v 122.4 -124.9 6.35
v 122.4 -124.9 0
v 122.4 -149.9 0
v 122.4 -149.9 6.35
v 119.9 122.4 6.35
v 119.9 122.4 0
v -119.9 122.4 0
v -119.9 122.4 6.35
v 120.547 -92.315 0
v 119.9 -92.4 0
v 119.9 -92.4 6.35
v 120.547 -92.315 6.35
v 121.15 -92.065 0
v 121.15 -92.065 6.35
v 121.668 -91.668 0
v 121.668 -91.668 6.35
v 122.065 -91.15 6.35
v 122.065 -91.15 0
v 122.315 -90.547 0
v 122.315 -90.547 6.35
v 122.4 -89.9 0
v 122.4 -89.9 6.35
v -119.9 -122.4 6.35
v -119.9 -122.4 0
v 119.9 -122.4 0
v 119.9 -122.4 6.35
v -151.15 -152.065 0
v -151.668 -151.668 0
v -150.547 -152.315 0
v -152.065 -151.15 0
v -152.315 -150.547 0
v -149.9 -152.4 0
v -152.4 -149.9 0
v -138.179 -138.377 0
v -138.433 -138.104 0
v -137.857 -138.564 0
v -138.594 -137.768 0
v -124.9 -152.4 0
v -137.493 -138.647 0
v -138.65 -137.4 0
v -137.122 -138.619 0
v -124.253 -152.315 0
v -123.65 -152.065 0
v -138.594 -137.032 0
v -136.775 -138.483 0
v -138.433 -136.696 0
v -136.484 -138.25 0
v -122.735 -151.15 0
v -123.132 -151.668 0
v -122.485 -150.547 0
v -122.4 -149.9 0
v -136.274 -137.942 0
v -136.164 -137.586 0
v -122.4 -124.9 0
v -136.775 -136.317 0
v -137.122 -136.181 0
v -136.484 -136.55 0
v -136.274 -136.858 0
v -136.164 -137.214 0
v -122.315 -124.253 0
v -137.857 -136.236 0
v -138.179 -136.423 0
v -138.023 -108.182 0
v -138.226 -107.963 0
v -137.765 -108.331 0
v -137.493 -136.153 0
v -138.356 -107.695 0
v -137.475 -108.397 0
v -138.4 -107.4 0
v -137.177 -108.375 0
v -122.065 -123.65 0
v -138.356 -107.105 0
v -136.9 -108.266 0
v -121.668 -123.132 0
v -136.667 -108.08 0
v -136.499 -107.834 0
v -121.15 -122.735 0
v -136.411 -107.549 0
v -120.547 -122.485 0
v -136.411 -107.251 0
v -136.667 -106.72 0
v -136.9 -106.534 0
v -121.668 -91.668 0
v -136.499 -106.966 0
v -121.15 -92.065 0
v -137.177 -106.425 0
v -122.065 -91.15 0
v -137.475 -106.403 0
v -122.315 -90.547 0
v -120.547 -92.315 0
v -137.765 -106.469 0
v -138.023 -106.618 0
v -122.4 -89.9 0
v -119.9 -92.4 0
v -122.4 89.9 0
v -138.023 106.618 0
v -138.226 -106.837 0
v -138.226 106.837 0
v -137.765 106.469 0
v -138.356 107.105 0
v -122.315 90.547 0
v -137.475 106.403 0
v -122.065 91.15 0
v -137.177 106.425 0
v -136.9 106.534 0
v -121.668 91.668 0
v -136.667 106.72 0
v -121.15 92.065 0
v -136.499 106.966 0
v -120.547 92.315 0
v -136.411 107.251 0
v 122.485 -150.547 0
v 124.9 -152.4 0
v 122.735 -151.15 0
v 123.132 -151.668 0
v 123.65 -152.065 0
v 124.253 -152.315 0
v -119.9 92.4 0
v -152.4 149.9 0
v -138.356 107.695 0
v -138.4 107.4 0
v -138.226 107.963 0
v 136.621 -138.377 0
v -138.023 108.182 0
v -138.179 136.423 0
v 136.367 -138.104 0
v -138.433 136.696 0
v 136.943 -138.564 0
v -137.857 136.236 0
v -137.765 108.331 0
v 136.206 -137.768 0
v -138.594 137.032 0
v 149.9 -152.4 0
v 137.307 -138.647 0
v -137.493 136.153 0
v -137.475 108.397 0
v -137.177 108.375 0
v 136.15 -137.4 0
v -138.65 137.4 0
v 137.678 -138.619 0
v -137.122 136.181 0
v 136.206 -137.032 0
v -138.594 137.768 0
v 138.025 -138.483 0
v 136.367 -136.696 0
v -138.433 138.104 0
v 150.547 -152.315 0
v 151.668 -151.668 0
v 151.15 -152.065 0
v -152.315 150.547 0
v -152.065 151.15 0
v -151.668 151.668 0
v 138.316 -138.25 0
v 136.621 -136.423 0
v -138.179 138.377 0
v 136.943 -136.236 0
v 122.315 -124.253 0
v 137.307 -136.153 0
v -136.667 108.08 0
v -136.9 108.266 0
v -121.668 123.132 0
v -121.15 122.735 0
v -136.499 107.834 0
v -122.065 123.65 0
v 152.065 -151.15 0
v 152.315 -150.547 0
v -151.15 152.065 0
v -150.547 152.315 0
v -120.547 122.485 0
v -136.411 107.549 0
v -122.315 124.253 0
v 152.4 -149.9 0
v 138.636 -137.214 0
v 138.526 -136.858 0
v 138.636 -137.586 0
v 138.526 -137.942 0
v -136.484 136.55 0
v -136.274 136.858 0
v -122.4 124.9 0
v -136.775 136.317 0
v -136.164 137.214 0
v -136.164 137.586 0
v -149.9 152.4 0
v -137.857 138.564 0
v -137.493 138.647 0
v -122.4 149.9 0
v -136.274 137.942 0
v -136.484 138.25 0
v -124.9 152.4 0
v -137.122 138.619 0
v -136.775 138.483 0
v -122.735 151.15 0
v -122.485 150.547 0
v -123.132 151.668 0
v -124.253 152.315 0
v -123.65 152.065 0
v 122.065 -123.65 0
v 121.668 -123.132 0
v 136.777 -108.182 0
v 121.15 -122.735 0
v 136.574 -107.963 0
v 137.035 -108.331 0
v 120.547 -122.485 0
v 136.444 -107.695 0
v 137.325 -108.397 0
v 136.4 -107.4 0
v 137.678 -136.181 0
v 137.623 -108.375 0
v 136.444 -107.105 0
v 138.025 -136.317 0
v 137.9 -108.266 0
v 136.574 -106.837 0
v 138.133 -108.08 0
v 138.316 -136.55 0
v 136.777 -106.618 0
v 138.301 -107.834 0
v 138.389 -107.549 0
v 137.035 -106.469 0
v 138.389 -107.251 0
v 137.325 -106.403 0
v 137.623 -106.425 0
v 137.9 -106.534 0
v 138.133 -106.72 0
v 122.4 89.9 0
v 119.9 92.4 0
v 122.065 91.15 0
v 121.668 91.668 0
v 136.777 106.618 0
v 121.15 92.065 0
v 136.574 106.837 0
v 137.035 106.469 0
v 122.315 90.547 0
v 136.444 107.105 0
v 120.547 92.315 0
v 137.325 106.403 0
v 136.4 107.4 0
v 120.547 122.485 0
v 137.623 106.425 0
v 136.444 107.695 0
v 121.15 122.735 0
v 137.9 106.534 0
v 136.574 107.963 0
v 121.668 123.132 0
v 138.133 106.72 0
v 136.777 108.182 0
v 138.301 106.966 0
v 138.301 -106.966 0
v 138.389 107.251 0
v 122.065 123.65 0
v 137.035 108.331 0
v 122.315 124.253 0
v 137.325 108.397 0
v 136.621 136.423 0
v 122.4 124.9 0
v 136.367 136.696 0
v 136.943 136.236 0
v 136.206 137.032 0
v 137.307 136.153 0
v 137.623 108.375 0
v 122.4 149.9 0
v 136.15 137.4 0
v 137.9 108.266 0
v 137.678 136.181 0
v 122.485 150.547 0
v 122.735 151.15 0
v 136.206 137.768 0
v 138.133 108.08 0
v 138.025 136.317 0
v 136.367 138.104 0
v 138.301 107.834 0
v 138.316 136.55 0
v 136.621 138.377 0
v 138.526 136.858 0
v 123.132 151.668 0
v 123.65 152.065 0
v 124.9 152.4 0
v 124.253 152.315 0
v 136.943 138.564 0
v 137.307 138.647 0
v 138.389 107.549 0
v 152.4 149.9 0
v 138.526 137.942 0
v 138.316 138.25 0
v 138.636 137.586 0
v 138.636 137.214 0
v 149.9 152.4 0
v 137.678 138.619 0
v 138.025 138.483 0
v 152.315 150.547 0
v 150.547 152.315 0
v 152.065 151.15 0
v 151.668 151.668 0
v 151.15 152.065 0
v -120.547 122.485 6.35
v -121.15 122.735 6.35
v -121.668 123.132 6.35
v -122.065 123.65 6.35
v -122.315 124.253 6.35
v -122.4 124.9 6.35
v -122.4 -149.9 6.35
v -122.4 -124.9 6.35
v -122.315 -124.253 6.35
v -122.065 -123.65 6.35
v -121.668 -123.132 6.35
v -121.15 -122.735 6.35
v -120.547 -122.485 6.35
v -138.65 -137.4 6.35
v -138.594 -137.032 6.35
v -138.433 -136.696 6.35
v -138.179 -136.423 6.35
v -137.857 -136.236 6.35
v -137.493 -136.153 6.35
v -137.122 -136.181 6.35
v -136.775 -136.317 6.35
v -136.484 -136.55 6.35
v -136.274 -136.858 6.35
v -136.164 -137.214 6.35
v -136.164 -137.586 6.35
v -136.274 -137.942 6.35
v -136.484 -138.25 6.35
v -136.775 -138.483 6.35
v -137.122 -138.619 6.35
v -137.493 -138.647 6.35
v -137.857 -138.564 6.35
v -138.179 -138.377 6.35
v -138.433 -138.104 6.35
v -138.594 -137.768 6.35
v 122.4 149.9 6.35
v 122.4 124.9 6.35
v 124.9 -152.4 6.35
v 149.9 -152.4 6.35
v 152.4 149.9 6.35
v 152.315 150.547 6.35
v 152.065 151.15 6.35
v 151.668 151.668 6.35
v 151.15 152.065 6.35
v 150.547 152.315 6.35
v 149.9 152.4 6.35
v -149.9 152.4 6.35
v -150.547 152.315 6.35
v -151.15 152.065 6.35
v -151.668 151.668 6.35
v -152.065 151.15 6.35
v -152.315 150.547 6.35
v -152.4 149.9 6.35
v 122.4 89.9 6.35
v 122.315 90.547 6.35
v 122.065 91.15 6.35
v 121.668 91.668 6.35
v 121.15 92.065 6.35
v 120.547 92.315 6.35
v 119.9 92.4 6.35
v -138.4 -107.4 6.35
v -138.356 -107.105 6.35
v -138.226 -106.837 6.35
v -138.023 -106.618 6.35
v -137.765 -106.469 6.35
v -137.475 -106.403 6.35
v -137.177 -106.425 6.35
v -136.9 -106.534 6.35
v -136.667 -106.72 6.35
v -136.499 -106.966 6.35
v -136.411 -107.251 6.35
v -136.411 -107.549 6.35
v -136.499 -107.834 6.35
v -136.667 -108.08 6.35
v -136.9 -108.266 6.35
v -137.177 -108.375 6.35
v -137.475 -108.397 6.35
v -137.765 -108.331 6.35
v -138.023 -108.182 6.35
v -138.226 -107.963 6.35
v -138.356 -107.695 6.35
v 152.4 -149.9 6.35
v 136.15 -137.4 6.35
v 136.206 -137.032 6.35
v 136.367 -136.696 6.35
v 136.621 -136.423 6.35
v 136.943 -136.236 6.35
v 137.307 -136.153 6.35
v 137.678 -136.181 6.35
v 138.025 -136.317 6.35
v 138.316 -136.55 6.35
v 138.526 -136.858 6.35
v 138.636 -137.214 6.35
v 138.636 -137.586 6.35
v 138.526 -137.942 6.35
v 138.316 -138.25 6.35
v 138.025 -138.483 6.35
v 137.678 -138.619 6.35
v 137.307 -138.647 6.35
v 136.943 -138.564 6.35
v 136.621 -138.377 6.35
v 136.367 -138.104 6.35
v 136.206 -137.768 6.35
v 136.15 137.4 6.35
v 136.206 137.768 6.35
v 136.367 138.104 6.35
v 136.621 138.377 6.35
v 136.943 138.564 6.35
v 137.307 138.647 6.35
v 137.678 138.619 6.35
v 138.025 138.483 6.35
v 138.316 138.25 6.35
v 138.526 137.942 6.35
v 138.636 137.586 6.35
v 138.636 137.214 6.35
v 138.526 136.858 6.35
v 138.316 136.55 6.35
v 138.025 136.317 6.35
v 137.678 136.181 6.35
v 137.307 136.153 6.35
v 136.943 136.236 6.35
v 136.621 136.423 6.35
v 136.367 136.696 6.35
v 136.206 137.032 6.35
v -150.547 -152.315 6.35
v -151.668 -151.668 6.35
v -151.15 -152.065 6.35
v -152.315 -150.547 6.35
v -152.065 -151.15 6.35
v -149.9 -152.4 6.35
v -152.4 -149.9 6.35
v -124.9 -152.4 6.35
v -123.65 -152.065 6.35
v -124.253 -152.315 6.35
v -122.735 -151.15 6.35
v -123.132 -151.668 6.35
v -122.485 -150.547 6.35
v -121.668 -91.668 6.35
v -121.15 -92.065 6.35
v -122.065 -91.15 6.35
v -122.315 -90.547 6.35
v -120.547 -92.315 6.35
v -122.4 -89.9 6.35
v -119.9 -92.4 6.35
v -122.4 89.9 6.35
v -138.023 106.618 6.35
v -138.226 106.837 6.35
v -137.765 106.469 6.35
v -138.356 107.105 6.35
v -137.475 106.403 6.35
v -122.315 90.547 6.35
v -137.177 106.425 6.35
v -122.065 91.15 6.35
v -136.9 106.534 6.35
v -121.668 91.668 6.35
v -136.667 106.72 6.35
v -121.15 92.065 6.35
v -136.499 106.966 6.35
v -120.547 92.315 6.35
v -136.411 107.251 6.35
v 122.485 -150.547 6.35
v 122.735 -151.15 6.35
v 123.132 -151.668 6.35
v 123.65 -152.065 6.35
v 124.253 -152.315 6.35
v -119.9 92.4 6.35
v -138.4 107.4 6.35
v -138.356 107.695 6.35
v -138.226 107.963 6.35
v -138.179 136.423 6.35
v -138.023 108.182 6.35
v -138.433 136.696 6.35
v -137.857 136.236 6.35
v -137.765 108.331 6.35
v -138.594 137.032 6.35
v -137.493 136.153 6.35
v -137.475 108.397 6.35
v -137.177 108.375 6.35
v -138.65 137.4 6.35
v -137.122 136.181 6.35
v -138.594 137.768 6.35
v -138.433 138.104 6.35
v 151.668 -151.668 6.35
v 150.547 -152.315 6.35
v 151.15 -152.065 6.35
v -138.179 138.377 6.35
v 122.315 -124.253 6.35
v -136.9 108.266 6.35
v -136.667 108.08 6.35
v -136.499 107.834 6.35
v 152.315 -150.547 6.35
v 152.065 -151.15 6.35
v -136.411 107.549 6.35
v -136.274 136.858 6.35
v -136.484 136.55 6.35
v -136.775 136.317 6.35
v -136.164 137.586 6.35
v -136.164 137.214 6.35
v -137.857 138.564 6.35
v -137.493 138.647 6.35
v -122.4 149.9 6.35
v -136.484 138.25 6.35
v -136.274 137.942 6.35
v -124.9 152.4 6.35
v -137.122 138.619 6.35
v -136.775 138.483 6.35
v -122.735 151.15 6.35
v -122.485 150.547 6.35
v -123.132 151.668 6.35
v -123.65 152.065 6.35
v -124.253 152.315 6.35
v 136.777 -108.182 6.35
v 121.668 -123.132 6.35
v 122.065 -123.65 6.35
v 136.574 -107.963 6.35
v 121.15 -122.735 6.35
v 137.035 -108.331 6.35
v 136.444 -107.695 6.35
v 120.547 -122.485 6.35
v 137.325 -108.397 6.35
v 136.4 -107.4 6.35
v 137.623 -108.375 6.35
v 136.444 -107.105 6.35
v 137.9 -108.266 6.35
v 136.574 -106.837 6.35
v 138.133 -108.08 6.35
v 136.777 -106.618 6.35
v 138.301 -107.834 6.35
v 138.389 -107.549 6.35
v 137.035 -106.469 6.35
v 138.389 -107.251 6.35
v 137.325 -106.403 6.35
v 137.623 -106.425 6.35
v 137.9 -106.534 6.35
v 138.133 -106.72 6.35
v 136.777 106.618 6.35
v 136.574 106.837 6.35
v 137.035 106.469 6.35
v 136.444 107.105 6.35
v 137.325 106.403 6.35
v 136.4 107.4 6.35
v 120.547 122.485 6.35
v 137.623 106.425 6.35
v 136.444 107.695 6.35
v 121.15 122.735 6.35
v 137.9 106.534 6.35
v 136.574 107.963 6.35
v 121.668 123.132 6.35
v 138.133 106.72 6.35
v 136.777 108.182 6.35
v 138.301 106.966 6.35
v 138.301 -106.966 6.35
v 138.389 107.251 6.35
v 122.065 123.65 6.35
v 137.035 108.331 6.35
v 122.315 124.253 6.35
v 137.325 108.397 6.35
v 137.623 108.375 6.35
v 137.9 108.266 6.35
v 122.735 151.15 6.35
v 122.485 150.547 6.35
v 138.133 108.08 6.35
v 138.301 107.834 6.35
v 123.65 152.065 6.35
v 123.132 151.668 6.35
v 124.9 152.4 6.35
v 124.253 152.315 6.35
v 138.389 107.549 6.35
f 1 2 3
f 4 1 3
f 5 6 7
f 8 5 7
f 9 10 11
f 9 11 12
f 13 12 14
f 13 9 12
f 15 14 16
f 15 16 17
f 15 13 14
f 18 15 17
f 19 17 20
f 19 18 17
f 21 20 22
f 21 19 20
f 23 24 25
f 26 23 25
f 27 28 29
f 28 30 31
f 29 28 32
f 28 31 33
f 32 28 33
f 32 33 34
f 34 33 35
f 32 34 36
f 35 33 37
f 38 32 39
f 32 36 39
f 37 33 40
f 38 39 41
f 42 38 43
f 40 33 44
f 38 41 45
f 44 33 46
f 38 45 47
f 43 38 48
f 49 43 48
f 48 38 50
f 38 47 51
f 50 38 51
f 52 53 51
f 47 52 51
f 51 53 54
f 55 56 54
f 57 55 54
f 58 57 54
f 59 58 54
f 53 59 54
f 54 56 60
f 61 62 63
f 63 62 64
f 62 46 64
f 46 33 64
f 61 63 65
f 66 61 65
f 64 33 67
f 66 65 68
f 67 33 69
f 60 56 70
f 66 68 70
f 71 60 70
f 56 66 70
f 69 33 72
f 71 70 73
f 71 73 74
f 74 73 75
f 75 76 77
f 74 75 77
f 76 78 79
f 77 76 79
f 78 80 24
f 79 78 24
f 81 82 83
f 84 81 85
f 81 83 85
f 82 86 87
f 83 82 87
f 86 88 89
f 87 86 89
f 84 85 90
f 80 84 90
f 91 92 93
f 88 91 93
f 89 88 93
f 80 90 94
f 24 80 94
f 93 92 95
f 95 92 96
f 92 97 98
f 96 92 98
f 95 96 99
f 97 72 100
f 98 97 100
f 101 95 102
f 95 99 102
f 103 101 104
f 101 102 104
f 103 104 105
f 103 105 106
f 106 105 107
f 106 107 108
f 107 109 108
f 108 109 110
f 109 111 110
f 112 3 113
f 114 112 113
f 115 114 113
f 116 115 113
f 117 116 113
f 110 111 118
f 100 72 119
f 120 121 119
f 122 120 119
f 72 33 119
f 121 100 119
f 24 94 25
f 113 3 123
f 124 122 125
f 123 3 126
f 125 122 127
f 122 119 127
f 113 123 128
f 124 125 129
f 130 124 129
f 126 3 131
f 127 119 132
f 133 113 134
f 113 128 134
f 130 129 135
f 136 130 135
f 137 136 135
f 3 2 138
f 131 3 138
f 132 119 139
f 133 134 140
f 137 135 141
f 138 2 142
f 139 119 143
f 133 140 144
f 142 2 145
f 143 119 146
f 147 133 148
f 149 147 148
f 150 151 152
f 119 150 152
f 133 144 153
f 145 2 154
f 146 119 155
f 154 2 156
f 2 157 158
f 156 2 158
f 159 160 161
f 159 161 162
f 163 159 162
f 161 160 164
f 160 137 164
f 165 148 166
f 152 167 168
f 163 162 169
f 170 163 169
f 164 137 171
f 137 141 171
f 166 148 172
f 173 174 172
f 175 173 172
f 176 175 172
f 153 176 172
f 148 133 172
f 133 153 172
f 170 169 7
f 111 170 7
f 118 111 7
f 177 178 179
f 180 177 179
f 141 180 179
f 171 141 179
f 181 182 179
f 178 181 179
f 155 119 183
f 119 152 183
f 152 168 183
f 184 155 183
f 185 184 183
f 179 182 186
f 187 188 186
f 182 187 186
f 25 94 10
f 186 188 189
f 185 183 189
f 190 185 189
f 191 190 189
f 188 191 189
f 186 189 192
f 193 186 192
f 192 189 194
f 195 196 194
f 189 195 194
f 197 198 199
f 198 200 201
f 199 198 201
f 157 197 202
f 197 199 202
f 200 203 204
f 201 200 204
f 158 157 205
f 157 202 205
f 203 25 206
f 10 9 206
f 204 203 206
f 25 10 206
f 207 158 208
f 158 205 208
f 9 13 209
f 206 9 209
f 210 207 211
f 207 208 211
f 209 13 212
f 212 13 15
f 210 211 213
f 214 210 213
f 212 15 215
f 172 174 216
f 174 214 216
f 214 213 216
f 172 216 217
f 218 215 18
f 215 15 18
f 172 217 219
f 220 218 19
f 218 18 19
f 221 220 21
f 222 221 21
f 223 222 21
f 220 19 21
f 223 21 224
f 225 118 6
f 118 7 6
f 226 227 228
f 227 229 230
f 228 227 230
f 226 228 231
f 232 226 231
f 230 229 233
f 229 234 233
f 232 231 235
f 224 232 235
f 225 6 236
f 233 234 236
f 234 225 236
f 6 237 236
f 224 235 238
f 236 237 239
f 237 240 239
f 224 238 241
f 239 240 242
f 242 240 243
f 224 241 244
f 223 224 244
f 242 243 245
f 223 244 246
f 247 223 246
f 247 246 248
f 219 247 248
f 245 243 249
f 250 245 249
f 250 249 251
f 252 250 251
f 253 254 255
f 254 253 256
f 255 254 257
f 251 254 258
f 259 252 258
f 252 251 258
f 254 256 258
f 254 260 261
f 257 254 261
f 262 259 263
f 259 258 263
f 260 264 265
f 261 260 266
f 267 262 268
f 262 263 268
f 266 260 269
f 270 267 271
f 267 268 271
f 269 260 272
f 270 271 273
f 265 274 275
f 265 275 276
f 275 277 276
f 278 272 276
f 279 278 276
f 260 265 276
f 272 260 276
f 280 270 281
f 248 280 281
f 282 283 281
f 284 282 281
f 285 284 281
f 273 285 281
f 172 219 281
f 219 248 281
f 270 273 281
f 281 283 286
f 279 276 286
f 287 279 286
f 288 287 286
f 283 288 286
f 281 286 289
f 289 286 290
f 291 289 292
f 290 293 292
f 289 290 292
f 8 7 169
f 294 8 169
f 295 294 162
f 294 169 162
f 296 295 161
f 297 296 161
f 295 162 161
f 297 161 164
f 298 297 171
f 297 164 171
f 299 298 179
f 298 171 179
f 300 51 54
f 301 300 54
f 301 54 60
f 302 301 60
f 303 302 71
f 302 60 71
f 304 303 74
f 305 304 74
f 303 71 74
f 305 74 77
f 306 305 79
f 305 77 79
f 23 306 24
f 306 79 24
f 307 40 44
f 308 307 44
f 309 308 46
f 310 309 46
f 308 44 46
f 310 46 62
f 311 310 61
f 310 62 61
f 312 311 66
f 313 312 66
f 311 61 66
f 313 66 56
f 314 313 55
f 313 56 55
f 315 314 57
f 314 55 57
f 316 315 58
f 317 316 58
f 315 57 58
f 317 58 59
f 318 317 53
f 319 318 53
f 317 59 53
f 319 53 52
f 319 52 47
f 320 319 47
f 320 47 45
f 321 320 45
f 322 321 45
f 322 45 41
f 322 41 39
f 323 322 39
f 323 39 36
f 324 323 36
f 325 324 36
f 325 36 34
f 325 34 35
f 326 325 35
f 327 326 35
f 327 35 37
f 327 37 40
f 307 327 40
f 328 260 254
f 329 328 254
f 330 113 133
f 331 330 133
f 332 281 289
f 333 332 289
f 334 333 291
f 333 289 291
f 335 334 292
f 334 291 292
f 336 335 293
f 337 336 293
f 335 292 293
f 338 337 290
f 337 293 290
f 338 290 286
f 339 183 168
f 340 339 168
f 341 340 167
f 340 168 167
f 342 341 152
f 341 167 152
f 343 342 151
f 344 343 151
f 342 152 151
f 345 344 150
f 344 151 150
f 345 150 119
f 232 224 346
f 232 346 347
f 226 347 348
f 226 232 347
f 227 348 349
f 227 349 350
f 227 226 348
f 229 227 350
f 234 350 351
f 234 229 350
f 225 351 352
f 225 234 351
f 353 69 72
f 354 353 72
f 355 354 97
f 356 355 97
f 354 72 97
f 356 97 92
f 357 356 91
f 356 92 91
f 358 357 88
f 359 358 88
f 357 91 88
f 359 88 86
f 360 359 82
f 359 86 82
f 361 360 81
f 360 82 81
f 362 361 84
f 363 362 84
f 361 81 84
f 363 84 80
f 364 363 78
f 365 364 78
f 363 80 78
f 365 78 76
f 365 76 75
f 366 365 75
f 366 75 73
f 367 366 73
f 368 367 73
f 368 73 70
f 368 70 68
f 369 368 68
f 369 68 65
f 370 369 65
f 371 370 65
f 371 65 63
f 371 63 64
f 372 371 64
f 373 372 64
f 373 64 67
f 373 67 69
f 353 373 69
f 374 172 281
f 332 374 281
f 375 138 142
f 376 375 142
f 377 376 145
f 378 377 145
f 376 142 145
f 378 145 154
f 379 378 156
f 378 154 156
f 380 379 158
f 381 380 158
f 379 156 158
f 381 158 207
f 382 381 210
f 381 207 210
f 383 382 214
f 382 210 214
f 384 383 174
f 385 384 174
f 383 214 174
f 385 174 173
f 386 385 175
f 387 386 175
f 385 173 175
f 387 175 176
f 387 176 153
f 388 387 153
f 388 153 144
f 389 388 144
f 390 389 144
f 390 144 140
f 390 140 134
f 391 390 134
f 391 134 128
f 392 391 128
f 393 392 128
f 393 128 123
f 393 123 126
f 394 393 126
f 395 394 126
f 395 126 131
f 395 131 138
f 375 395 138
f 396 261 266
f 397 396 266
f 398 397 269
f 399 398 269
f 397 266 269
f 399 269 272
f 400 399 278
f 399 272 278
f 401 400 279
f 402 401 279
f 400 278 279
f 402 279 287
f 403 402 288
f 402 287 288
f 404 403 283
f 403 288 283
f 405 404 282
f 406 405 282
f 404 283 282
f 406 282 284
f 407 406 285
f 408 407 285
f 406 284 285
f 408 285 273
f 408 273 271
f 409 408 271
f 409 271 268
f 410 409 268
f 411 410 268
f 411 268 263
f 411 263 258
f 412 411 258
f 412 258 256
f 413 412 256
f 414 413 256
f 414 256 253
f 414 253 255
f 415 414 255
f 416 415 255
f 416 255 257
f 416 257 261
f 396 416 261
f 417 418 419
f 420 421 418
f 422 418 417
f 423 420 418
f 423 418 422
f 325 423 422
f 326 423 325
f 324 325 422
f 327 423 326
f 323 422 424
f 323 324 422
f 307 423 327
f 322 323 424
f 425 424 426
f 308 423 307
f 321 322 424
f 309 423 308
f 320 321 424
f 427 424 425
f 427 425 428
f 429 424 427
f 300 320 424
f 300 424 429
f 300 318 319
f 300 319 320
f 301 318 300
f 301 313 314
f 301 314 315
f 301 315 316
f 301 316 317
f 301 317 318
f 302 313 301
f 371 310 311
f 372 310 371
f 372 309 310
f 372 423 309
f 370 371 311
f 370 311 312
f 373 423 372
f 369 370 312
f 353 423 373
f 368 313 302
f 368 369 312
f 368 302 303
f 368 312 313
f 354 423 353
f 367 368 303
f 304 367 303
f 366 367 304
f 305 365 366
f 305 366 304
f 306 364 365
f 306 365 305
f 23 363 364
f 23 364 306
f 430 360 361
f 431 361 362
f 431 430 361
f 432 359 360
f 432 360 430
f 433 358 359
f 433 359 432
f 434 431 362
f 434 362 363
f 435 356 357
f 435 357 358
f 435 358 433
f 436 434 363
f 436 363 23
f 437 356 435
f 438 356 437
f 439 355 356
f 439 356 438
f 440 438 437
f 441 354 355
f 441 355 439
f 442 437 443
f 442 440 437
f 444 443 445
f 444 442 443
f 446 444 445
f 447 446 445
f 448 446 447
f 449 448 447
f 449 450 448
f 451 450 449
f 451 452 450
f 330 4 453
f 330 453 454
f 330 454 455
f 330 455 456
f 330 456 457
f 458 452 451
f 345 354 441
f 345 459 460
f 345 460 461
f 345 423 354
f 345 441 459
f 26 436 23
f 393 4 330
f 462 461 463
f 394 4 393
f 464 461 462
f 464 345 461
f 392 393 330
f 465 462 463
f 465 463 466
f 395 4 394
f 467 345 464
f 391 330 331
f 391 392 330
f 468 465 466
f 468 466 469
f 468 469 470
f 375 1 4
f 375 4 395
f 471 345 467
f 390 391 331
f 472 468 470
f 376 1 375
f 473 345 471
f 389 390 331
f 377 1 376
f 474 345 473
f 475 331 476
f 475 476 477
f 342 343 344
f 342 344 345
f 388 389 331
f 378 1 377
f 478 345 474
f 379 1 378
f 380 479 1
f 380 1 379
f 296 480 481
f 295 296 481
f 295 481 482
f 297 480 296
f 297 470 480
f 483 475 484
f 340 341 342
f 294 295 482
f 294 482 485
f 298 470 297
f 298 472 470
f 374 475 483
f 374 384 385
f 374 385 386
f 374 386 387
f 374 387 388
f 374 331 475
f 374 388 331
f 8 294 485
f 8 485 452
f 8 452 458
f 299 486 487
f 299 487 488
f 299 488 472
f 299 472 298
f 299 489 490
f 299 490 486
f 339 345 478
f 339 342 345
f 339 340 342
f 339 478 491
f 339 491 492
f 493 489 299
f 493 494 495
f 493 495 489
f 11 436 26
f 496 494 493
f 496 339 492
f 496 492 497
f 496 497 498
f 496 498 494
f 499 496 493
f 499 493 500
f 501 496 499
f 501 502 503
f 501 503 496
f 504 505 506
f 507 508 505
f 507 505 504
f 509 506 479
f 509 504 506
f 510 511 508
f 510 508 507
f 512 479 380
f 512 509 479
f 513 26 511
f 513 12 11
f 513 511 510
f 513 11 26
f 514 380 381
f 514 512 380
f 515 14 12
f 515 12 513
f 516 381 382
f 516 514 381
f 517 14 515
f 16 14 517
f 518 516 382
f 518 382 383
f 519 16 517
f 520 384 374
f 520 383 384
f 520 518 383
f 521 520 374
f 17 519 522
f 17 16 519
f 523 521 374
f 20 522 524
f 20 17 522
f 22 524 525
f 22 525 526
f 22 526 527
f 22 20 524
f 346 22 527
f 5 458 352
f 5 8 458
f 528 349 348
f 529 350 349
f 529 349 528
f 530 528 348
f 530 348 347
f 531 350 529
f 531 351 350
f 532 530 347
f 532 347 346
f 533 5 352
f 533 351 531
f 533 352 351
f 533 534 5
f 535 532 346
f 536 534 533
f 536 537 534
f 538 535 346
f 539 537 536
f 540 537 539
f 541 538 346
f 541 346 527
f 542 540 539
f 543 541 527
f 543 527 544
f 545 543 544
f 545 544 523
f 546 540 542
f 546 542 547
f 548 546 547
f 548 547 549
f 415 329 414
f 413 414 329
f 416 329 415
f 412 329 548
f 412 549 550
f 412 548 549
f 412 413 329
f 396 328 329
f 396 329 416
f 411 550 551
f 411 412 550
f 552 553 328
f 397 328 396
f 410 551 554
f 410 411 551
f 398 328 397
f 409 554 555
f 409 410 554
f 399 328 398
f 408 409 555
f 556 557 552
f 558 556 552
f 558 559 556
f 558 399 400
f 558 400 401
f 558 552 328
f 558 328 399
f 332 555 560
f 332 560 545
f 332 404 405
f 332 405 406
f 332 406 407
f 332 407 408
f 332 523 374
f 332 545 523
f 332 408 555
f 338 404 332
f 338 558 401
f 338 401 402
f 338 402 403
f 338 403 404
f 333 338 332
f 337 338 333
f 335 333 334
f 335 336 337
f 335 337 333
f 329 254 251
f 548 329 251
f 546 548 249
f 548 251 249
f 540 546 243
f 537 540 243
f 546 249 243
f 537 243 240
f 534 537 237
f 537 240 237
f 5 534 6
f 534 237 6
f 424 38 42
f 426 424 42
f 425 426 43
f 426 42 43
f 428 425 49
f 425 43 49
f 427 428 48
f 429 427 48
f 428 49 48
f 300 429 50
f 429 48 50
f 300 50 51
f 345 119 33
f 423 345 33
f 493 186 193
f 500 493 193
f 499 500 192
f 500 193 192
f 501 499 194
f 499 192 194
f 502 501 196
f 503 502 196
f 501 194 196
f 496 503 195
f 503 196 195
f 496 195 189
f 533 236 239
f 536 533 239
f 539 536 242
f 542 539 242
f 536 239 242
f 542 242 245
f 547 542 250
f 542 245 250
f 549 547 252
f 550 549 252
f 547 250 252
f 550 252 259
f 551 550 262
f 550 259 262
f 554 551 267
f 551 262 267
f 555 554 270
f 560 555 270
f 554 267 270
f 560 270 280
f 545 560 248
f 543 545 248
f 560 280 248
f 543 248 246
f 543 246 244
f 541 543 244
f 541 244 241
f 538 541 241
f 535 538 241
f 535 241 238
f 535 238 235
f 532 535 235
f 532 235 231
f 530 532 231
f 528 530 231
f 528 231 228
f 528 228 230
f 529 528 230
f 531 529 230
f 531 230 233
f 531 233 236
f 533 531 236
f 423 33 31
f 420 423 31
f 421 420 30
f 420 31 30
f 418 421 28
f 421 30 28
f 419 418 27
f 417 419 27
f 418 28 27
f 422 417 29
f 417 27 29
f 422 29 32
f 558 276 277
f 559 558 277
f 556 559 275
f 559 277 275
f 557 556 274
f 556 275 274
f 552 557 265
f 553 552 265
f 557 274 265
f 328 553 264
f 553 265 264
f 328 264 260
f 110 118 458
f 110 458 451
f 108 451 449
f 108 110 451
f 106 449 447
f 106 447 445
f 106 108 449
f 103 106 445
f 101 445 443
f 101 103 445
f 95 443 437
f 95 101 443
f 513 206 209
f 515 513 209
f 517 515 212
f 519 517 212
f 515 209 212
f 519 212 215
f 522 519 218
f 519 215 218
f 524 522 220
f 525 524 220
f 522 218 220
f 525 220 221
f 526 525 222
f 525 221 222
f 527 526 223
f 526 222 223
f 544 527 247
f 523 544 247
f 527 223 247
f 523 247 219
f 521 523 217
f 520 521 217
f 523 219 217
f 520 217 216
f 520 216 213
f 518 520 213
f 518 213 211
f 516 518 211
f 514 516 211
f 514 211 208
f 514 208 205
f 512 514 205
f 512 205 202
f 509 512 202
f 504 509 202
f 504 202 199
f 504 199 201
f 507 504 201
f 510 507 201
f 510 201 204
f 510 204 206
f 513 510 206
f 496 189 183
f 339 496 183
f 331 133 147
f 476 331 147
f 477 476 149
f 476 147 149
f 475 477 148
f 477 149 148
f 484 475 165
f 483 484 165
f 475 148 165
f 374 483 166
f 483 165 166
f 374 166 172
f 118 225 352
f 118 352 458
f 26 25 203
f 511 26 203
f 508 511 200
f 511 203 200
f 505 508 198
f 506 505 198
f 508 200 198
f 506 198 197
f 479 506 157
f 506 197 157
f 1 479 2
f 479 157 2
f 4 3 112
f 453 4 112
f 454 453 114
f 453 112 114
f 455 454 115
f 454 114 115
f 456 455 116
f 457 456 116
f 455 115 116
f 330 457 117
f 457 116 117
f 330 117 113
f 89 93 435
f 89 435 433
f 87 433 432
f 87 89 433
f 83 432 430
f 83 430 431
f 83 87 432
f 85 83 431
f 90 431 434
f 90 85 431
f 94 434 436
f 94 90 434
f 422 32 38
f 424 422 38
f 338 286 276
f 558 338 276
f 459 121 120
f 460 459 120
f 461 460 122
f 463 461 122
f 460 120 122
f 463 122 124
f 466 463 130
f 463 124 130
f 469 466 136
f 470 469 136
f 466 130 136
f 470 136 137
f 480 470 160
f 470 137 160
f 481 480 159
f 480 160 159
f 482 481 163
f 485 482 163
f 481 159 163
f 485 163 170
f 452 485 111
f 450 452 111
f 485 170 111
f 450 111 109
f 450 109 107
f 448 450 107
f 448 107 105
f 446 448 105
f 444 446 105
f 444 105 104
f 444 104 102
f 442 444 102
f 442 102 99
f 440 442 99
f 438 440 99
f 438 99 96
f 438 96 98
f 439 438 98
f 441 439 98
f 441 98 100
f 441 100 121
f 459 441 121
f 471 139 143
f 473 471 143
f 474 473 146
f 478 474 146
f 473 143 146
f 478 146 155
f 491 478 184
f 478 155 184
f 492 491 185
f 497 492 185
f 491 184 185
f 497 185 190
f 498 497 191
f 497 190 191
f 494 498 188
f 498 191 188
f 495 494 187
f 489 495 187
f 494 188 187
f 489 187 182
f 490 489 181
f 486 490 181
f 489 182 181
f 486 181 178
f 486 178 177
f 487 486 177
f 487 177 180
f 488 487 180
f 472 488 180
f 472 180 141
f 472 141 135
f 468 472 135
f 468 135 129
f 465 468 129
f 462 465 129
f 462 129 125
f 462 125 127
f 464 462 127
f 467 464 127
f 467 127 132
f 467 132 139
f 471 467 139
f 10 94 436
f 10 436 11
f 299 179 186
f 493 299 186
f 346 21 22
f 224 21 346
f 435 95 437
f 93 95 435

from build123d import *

# Parameters (mm, degrees)
BOSS_EXTRUDE1_DEPTH  = 6.35
M3_CLEARANCE_HOLE3_D = 2
M3_CLEARANCE_HOLE2_D = 2.5


with BuildPart() as part:
    # Sketch7 → Boss-Extrude1 (new body)
    with BuildSketch(Plane.XY):
        with BuildLine():
            Line((-119.9, -122.4), (119.9, -122.4))
            ThreePointArc((119.9, -122.4), (121.667766953, -123.132233047), (122.4, -124.9))
            Line((122.4, -124.9), (122.4, -149.9))
            ThreePointArc((122.4, -149.9), (123.132233047, -151.667766953), (124.9, -152.4))
            Line((124.9, -152.4), (149.9, -152.4))
            ThreePointArc((149.9, -152.4), (151.667766953, -151.667766953), (152.4, -149.9))
            Line((152.4, -149.9), (152.4, -102.186961883))
            Line((152.4, -102.186961883), (152.4, 120.74319893))
            Line((152.4, 120.74319893), (152.4, 149.9))
            ThreePointArc((152.4, 149.9), (151.667766953, 151.667766953), (149.9, 152.4))
            Line((149.9, 152.4), (124.9, 152.4))
            ThreePointArc((124.9, 152.4), (123.132233047, 151.667766953), (122.4, 149.9))
            Line((122.4, 149.9), (122.4, 124.9))
            ThreePointArc((122.4, 124.9), (121.667766953, 123.132233047), (119.9, 122.4))
            Line((119.9, 122.4), (-119.9, 122.4))
            ThreePointArc((-119.9, 122.4), (-121.667766953, 123.132233047), (-122.4, 124.9))
            Line((-122.4, 124.9), (-122.4, 149.9))
            ThreePointArc((-122.4, 149.9), (-123.132233047, 151.667766953), (-124.9, 152.4))
            Line((-124.9, 152.4), (-149.9, 152.4))
            ThreePointArc((-149.9, 152.4), (-151.667766953, 151.667766953), (-152.4, 149.9))
            Line((-152.4, 149.9), (-152.4, 102.186961883))
            Line((-152.4, 102.186961883), (-152.4, -120.74319893))
            Line((-152.4, -120.74319893), (-152.4, -149.9))
            ThreePointArc((-152.4, -149.9), (-151.667766953, -151.667766953), (-149.9, -152.4))
            Line((-149.9, -152.4), (-124.9, -152.4))
            ThreePointArc((-124.9, -152.4), (-123.132233047, -151.667766953), (-122.4, -149.9))
            Line((-122.4, -149.9), (-122.4, -124.9))
            ThreePointArc((-122.4, -124.9), (-121.667766953, -123.132233047), (-119.9, -122.4))
        make_face()
        with BuildLine():
            Line((-119.9, -92.4), (119.9, -92.4))
            ThreePointArc((119.9, -92.4), (121.667766953, -91.667766953), (122.4, -89.9))
            Line((122.4, -89.9), (122.4, 89.9))
            ThreePointArc((122.4, 89.9), (121.667766953, 91.667766953), (119.9, 92.4))
            Line((119.9, 92.4), (-119.9, 92.4))
            ThreePointArc((-119.9, 92.4), (-121.667766953, 91.667766953), (-122.4, 89.9))
            Line((-122.4, 89.9), (-122.4, -89.9))
            ThreePointArc((-122.4, -89.9), (-121.667766953, -91.667766953), (-119.9, -92.4))
        make_face(mode=Mode.SUBTRACT)
    extrude(amount=BOSS_EXTRUDE1_DEPTH)

    # M3 Clearance Hole3 (through all)
    with Locations(Plane.XY.offset(6.35)):
        with Locations((-137.4, 107.4), (-137.4, -107.4), (137.4, -107.4), (137.4, 107.4)):
            Hole(M3_CLEARANCE_HOLE3_D / 2)

    # M3 Clearance Hole2 (through all)
    with Locations(Plane.XY.offset(6.35)):
        with Locations((-137.4, 137.4), (137.4, 137.4), (137.4, -137.4), (-137.4, -137.4)):
            Hole(M3_CLEARANCE_HOLE2_D / 2)


solid = part.part
